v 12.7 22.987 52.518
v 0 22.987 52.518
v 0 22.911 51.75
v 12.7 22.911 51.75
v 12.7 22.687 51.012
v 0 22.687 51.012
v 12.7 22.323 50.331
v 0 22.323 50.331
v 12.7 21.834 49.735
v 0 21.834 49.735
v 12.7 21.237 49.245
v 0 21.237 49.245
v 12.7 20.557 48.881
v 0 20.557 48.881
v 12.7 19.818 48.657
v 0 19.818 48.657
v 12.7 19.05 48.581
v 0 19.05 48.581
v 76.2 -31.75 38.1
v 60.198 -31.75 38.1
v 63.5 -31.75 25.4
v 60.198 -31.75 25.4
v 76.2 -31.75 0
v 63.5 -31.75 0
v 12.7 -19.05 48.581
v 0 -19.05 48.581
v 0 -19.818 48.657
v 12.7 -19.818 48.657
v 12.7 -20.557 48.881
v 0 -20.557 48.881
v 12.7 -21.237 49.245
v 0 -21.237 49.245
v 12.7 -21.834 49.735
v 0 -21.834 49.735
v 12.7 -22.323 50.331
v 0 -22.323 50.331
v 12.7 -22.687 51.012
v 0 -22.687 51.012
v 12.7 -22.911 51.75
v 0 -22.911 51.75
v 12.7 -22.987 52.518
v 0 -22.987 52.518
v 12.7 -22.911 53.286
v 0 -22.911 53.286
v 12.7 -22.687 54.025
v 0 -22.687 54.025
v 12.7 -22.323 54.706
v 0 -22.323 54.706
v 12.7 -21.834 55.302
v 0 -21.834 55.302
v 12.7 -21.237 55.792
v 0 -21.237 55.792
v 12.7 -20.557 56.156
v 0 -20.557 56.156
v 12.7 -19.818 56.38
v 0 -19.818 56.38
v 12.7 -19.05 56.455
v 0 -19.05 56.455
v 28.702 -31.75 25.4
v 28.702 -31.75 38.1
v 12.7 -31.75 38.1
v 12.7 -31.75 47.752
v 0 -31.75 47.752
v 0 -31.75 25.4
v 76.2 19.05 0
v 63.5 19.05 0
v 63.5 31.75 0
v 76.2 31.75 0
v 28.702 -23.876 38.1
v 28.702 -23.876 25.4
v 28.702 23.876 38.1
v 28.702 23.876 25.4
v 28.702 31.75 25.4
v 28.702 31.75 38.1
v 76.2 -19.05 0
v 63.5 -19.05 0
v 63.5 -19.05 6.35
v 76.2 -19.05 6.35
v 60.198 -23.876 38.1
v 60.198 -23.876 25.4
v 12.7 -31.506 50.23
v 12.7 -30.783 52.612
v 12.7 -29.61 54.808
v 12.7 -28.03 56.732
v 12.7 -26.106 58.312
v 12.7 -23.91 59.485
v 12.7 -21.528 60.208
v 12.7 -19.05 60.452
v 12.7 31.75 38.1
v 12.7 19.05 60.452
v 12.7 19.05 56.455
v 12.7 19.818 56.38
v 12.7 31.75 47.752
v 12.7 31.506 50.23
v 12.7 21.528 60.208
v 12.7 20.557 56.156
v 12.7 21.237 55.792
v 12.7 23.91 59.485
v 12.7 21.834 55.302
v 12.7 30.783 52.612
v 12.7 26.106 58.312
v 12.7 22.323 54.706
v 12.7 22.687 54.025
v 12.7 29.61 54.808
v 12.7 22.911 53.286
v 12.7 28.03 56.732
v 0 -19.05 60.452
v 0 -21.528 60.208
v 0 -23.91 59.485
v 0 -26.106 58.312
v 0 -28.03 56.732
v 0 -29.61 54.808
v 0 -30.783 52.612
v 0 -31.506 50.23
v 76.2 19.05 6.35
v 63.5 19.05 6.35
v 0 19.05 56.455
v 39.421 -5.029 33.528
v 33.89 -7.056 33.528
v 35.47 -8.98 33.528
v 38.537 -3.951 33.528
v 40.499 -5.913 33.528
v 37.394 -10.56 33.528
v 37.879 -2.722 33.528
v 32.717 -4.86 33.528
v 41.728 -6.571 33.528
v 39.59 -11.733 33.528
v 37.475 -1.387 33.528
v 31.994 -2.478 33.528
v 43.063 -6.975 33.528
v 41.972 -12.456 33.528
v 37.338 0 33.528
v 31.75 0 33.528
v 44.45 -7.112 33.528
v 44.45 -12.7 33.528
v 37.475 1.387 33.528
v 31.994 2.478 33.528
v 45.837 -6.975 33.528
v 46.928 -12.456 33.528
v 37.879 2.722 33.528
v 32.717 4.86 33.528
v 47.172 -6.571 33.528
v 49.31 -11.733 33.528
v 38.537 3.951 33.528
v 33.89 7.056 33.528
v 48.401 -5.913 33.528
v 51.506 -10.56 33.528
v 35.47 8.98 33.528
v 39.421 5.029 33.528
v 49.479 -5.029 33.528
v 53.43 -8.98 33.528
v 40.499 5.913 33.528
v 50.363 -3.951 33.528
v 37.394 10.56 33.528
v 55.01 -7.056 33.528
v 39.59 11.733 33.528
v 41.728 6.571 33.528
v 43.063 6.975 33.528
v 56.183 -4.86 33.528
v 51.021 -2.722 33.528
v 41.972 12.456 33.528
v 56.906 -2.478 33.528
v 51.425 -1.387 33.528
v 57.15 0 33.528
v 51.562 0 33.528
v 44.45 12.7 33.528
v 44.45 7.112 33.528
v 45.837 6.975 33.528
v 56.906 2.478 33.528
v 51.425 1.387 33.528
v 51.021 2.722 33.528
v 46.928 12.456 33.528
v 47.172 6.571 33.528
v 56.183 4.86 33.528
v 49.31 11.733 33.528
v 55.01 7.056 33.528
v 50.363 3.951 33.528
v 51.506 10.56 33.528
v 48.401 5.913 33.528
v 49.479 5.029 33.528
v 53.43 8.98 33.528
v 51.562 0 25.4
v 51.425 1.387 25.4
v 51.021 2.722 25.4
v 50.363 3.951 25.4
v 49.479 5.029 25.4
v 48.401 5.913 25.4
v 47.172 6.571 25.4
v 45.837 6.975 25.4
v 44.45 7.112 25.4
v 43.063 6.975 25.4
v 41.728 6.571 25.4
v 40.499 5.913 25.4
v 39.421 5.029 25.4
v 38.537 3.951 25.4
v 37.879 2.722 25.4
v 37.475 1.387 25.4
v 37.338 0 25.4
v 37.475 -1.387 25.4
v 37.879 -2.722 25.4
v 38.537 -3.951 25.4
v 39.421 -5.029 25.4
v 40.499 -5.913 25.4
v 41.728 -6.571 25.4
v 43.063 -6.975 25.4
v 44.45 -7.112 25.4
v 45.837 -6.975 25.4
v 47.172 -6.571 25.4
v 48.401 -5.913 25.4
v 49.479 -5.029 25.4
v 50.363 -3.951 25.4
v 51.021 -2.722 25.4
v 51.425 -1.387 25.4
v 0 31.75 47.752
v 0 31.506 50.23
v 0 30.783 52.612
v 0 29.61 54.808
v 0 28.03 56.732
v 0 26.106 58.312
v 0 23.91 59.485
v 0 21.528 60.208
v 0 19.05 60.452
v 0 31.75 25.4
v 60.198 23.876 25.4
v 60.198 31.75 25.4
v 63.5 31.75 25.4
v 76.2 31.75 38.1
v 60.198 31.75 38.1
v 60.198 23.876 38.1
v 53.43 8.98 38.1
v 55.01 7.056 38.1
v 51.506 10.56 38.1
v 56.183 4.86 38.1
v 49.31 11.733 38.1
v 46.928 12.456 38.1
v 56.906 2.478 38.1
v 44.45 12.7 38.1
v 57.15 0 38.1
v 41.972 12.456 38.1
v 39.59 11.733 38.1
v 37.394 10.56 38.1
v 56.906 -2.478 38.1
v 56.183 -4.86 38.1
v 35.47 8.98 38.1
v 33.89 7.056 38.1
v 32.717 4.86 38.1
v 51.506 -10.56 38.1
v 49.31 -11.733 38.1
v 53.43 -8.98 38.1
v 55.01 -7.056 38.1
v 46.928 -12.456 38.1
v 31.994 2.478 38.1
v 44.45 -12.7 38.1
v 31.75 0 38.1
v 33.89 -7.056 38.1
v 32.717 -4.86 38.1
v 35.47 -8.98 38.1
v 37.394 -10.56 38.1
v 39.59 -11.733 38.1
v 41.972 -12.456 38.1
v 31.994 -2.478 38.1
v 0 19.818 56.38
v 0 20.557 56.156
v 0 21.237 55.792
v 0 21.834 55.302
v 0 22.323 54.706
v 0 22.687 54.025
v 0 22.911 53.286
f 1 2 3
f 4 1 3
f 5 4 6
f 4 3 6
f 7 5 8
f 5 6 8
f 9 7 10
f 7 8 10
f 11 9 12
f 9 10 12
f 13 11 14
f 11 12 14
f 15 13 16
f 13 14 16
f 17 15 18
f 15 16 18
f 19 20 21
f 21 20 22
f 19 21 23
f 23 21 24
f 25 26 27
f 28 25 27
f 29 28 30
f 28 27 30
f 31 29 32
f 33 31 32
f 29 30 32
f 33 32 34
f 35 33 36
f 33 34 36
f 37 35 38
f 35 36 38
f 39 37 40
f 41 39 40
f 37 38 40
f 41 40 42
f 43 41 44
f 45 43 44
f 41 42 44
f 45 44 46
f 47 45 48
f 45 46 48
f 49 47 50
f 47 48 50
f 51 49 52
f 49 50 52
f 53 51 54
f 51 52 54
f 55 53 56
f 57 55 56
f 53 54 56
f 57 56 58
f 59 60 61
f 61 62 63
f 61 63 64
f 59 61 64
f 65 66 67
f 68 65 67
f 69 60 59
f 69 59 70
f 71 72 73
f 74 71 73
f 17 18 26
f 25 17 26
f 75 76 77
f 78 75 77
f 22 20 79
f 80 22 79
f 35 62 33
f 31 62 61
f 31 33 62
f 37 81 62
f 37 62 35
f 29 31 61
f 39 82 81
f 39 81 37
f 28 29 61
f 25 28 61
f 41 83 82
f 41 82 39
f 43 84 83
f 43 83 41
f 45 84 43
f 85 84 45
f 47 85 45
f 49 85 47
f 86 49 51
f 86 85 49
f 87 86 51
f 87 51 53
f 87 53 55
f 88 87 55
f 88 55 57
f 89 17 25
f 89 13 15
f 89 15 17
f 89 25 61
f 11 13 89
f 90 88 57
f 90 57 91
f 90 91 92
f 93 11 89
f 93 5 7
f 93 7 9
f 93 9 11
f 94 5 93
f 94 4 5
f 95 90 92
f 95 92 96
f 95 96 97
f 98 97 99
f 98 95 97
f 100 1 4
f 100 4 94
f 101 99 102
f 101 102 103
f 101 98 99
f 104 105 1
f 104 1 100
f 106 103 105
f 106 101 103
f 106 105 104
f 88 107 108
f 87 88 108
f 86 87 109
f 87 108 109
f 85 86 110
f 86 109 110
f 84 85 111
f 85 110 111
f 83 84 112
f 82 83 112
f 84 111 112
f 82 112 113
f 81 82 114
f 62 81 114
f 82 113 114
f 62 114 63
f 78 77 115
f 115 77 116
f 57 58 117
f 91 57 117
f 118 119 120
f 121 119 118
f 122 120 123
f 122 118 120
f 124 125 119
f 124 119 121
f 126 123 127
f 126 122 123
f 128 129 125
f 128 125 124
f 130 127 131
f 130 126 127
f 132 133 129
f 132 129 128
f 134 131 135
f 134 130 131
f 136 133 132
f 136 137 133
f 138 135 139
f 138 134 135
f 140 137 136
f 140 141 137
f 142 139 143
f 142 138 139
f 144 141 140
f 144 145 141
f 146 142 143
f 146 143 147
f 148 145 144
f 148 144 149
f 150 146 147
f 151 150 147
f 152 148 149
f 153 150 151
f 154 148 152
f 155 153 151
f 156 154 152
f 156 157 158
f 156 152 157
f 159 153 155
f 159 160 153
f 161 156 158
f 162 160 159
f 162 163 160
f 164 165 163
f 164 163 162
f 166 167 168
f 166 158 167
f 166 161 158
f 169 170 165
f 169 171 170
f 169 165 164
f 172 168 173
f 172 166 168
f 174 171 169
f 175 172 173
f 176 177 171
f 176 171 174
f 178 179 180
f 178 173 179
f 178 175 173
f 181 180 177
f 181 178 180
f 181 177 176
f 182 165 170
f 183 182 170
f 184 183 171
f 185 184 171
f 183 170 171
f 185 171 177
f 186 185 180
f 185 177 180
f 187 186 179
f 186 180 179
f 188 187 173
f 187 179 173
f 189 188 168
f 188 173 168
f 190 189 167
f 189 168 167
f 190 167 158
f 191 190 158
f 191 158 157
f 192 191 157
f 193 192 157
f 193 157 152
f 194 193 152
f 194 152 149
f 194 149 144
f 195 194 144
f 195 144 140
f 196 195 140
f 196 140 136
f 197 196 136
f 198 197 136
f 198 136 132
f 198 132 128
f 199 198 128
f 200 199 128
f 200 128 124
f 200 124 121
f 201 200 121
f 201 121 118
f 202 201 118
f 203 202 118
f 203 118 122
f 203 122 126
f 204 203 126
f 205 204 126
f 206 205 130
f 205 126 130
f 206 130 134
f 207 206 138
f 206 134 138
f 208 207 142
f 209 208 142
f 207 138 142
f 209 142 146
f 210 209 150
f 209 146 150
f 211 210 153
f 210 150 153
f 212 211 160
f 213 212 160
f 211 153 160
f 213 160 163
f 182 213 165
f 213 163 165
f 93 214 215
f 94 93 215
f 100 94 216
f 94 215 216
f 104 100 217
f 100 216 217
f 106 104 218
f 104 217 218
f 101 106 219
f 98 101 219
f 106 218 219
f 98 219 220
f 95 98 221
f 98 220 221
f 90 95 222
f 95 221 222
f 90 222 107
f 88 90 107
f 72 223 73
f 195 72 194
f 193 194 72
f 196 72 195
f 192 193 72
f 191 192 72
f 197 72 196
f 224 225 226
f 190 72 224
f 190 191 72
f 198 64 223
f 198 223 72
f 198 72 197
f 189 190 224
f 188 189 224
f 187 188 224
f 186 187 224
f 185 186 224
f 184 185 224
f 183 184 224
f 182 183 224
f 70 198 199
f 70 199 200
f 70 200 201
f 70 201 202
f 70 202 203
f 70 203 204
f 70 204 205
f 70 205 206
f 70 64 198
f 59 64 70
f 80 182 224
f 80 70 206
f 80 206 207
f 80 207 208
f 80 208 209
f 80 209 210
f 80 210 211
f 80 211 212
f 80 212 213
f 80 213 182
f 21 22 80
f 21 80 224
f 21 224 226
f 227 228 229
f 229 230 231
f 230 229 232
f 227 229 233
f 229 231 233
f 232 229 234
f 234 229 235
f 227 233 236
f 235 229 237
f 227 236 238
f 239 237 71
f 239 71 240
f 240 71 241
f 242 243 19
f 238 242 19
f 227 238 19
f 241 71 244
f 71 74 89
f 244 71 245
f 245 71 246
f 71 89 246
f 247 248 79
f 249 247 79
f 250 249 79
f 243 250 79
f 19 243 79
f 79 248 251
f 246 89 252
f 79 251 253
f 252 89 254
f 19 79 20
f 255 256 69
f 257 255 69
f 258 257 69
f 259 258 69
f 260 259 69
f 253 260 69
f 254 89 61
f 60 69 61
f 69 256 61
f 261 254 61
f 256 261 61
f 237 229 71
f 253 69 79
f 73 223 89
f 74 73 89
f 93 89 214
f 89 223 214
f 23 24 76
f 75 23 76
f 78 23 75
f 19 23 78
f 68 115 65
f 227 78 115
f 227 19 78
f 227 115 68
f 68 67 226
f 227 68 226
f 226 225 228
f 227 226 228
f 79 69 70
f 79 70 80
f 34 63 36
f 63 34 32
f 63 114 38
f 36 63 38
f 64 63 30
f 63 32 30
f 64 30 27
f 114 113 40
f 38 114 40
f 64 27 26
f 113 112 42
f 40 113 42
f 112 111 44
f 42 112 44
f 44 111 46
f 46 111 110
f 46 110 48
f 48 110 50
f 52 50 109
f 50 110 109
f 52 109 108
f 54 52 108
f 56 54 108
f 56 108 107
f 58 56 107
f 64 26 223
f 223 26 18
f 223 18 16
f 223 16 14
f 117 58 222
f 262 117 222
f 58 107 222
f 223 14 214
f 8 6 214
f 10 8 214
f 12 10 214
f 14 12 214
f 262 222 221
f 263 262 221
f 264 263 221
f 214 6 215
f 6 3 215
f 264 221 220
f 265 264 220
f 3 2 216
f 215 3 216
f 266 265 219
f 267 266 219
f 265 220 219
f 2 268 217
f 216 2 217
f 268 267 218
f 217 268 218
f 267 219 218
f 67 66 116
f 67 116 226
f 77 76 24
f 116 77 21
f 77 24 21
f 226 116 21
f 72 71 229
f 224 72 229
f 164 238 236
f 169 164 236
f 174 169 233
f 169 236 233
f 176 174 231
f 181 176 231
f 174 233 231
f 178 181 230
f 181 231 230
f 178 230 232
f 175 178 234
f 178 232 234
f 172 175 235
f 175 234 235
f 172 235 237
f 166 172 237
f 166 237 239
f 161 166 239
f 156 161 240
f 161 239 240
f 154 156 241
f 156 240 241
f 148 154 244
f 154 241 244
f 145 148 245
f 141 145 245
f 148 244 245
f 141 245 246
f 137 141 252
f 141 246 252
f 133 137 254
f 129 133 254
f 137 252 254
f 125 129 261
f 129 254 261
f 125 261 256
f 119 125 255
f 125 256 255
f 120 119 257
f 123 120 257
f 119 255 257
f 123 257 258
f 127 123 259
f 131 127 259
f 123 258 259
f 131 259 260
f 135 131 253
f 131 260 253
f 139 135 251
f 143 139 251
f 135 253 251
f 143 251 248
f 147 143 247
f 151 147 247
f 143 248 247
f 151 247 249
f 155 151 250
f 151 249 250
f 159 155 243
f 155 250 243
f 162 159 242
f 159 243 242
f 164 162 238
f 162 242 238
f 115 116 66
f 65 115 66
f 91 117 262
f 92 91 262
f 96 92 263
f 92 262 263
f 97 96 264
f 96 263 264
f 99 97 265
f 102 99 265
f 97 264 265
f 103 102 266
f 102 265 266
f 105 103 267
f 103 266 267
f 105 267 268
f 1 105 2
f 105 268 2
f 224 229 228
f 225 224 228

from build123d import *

# Parameters (mm, degrees)
F1_DEPTH  = 76.2
F2_DEPTH  = 12.7
F3_W      = 31.496
F3_H      = 7.874
F4_DEPTH  = 38.101
F6_DEPTH  = 63.501
F7_W      = 31.496
F7_H      = 25.4
F8_DEPTH  = 55.627
F9_W      = 28.702
F9_H      = 25.4
F10_DEPTH = 63.501
F11_R     = 7.112
F12_DEPTH = 38.101
F11_R_2   = 12.7
F13_DEPTH = 4.572


with BuildPart() as f1:
    # F0 (on Right) → F1 (new body)
    with BuildSketch(Plane.YZ):
        Polygon((-31.75, 38.1), (-31.75, 0), (-19.05, 0), (-19.05, 6.35), (19.05, 6.35), (19.05, 0), (31.75, 0), (31.75, 38.1), align=None)
    extrude(amount=F1_DEPTH)

    # F0 (on Right) → F2 (join)
    with BuildSketch(Plane.YZ):
        with BuildLine():
            Line((-31.75, 47.752), (-31.75, 38.1))
            Line((-31.75, 38.1), (31.75, 38.1))
            Line((31.75, 38.1), (31.75, 47.752))
            ThreePointArc((31.75, 47.752), (28.0302561211, 56.7322561211), (19.05, 60.452))
            Line((19.05, 60.452), (-19.05, 60.452))
            ThreePointArc((-19.05, 60.452), (-28.0302561211, 56.7322561211), (-31.75, 47.752))
        make_face()
        with BuildLine():
            ThreePointArc((-19.05, 48.5814124708), (-22.987, 52.5184124708), (-19.05, 56.4554124708))
            Line((-19.05, 56.4554124708), (19.05, 56.4554124708))
            ThreePointArc((19.05, 56.4554124708), (21.8338793975, 55.3022918683), (22.987, 52.5184124708))
            ThreePointArc((22.987, 52.5184124708), (21.8338793975, 49.7345330733), (19.05, 48.5814124708))
            Line((19.05, 48.5814124708), (-19.05, 48.5814124708))
        make_face(mode=Mode.SUBTRACT)
    extrude(amount=F2_DEPTH)

    # F3 (on face) → F4 (cut, through all)
    with BuildSketch(Plane.XY.offset(38.1)):
        with Locations((44.45, 27.813)):
            Rectangle(F3_W, F3_H)
        with Locations((44.45, -27.813)):
            Rectangle(F3_W, F3_H)
    extrude(amount=-F4_DEPTH, mode=Mode.SUBTRACT)

    # F5 (on face) → F6 (cut, through all)
    with BuildSketch(Plane.XZ.offset(31.75)):
        Polygon((60.198, 0), (63.5, 0), (63.5, 25.4), (62.9462525249, 25.4), (60.198, 25.4), align=None)
    extrude(amount=-F6_DEPTH, mode=Mode.SUBTRACT)

    # F7 (on face) → F8 (cut, through all)
    with BuildSketch(Plane.XZ.offset(23.876)):
        with Locations((44.45, 12.7)):
            Rectangle(F7_W, F7_H)
    extrude(amount=-F8_DEPTH, mode=Mode.SUBTRACT)

    # F9 (on face) → F10 (cut, through all)
    with BuildSketch(Plane.XZ.offset(31.75)):
        with Locations((14.351, 12.7)):
            Rectangle(F9_W, F9_H)
    extrude(amount=-F10_DEPTH, mode=Mode.SUBTRACT)

    # F11 (on face) → F12 (cut, through all)
    with BuildSketch(Plane.XY.offset(38.1)):
        with Locations((44.45, 0)):
            Circle(F11_R)
    extrude(amount=-F12_DEPTH, mode=Mode.SUBTRACT)

    # F11 (on face) → F13 (cut)
    with BuildSketch(Plane.XY.offset(38.1)):
        with Locations((44.45, 0)):
            Circle(F11_R_2)
        with Locations((44.45, 0)):
            Circle(F11_R, mode=Mode.SUBTRACT)
    extrude(amount=-F13_DEPTH, mode=Mode.SUBTRACT)


solid = f1.part
